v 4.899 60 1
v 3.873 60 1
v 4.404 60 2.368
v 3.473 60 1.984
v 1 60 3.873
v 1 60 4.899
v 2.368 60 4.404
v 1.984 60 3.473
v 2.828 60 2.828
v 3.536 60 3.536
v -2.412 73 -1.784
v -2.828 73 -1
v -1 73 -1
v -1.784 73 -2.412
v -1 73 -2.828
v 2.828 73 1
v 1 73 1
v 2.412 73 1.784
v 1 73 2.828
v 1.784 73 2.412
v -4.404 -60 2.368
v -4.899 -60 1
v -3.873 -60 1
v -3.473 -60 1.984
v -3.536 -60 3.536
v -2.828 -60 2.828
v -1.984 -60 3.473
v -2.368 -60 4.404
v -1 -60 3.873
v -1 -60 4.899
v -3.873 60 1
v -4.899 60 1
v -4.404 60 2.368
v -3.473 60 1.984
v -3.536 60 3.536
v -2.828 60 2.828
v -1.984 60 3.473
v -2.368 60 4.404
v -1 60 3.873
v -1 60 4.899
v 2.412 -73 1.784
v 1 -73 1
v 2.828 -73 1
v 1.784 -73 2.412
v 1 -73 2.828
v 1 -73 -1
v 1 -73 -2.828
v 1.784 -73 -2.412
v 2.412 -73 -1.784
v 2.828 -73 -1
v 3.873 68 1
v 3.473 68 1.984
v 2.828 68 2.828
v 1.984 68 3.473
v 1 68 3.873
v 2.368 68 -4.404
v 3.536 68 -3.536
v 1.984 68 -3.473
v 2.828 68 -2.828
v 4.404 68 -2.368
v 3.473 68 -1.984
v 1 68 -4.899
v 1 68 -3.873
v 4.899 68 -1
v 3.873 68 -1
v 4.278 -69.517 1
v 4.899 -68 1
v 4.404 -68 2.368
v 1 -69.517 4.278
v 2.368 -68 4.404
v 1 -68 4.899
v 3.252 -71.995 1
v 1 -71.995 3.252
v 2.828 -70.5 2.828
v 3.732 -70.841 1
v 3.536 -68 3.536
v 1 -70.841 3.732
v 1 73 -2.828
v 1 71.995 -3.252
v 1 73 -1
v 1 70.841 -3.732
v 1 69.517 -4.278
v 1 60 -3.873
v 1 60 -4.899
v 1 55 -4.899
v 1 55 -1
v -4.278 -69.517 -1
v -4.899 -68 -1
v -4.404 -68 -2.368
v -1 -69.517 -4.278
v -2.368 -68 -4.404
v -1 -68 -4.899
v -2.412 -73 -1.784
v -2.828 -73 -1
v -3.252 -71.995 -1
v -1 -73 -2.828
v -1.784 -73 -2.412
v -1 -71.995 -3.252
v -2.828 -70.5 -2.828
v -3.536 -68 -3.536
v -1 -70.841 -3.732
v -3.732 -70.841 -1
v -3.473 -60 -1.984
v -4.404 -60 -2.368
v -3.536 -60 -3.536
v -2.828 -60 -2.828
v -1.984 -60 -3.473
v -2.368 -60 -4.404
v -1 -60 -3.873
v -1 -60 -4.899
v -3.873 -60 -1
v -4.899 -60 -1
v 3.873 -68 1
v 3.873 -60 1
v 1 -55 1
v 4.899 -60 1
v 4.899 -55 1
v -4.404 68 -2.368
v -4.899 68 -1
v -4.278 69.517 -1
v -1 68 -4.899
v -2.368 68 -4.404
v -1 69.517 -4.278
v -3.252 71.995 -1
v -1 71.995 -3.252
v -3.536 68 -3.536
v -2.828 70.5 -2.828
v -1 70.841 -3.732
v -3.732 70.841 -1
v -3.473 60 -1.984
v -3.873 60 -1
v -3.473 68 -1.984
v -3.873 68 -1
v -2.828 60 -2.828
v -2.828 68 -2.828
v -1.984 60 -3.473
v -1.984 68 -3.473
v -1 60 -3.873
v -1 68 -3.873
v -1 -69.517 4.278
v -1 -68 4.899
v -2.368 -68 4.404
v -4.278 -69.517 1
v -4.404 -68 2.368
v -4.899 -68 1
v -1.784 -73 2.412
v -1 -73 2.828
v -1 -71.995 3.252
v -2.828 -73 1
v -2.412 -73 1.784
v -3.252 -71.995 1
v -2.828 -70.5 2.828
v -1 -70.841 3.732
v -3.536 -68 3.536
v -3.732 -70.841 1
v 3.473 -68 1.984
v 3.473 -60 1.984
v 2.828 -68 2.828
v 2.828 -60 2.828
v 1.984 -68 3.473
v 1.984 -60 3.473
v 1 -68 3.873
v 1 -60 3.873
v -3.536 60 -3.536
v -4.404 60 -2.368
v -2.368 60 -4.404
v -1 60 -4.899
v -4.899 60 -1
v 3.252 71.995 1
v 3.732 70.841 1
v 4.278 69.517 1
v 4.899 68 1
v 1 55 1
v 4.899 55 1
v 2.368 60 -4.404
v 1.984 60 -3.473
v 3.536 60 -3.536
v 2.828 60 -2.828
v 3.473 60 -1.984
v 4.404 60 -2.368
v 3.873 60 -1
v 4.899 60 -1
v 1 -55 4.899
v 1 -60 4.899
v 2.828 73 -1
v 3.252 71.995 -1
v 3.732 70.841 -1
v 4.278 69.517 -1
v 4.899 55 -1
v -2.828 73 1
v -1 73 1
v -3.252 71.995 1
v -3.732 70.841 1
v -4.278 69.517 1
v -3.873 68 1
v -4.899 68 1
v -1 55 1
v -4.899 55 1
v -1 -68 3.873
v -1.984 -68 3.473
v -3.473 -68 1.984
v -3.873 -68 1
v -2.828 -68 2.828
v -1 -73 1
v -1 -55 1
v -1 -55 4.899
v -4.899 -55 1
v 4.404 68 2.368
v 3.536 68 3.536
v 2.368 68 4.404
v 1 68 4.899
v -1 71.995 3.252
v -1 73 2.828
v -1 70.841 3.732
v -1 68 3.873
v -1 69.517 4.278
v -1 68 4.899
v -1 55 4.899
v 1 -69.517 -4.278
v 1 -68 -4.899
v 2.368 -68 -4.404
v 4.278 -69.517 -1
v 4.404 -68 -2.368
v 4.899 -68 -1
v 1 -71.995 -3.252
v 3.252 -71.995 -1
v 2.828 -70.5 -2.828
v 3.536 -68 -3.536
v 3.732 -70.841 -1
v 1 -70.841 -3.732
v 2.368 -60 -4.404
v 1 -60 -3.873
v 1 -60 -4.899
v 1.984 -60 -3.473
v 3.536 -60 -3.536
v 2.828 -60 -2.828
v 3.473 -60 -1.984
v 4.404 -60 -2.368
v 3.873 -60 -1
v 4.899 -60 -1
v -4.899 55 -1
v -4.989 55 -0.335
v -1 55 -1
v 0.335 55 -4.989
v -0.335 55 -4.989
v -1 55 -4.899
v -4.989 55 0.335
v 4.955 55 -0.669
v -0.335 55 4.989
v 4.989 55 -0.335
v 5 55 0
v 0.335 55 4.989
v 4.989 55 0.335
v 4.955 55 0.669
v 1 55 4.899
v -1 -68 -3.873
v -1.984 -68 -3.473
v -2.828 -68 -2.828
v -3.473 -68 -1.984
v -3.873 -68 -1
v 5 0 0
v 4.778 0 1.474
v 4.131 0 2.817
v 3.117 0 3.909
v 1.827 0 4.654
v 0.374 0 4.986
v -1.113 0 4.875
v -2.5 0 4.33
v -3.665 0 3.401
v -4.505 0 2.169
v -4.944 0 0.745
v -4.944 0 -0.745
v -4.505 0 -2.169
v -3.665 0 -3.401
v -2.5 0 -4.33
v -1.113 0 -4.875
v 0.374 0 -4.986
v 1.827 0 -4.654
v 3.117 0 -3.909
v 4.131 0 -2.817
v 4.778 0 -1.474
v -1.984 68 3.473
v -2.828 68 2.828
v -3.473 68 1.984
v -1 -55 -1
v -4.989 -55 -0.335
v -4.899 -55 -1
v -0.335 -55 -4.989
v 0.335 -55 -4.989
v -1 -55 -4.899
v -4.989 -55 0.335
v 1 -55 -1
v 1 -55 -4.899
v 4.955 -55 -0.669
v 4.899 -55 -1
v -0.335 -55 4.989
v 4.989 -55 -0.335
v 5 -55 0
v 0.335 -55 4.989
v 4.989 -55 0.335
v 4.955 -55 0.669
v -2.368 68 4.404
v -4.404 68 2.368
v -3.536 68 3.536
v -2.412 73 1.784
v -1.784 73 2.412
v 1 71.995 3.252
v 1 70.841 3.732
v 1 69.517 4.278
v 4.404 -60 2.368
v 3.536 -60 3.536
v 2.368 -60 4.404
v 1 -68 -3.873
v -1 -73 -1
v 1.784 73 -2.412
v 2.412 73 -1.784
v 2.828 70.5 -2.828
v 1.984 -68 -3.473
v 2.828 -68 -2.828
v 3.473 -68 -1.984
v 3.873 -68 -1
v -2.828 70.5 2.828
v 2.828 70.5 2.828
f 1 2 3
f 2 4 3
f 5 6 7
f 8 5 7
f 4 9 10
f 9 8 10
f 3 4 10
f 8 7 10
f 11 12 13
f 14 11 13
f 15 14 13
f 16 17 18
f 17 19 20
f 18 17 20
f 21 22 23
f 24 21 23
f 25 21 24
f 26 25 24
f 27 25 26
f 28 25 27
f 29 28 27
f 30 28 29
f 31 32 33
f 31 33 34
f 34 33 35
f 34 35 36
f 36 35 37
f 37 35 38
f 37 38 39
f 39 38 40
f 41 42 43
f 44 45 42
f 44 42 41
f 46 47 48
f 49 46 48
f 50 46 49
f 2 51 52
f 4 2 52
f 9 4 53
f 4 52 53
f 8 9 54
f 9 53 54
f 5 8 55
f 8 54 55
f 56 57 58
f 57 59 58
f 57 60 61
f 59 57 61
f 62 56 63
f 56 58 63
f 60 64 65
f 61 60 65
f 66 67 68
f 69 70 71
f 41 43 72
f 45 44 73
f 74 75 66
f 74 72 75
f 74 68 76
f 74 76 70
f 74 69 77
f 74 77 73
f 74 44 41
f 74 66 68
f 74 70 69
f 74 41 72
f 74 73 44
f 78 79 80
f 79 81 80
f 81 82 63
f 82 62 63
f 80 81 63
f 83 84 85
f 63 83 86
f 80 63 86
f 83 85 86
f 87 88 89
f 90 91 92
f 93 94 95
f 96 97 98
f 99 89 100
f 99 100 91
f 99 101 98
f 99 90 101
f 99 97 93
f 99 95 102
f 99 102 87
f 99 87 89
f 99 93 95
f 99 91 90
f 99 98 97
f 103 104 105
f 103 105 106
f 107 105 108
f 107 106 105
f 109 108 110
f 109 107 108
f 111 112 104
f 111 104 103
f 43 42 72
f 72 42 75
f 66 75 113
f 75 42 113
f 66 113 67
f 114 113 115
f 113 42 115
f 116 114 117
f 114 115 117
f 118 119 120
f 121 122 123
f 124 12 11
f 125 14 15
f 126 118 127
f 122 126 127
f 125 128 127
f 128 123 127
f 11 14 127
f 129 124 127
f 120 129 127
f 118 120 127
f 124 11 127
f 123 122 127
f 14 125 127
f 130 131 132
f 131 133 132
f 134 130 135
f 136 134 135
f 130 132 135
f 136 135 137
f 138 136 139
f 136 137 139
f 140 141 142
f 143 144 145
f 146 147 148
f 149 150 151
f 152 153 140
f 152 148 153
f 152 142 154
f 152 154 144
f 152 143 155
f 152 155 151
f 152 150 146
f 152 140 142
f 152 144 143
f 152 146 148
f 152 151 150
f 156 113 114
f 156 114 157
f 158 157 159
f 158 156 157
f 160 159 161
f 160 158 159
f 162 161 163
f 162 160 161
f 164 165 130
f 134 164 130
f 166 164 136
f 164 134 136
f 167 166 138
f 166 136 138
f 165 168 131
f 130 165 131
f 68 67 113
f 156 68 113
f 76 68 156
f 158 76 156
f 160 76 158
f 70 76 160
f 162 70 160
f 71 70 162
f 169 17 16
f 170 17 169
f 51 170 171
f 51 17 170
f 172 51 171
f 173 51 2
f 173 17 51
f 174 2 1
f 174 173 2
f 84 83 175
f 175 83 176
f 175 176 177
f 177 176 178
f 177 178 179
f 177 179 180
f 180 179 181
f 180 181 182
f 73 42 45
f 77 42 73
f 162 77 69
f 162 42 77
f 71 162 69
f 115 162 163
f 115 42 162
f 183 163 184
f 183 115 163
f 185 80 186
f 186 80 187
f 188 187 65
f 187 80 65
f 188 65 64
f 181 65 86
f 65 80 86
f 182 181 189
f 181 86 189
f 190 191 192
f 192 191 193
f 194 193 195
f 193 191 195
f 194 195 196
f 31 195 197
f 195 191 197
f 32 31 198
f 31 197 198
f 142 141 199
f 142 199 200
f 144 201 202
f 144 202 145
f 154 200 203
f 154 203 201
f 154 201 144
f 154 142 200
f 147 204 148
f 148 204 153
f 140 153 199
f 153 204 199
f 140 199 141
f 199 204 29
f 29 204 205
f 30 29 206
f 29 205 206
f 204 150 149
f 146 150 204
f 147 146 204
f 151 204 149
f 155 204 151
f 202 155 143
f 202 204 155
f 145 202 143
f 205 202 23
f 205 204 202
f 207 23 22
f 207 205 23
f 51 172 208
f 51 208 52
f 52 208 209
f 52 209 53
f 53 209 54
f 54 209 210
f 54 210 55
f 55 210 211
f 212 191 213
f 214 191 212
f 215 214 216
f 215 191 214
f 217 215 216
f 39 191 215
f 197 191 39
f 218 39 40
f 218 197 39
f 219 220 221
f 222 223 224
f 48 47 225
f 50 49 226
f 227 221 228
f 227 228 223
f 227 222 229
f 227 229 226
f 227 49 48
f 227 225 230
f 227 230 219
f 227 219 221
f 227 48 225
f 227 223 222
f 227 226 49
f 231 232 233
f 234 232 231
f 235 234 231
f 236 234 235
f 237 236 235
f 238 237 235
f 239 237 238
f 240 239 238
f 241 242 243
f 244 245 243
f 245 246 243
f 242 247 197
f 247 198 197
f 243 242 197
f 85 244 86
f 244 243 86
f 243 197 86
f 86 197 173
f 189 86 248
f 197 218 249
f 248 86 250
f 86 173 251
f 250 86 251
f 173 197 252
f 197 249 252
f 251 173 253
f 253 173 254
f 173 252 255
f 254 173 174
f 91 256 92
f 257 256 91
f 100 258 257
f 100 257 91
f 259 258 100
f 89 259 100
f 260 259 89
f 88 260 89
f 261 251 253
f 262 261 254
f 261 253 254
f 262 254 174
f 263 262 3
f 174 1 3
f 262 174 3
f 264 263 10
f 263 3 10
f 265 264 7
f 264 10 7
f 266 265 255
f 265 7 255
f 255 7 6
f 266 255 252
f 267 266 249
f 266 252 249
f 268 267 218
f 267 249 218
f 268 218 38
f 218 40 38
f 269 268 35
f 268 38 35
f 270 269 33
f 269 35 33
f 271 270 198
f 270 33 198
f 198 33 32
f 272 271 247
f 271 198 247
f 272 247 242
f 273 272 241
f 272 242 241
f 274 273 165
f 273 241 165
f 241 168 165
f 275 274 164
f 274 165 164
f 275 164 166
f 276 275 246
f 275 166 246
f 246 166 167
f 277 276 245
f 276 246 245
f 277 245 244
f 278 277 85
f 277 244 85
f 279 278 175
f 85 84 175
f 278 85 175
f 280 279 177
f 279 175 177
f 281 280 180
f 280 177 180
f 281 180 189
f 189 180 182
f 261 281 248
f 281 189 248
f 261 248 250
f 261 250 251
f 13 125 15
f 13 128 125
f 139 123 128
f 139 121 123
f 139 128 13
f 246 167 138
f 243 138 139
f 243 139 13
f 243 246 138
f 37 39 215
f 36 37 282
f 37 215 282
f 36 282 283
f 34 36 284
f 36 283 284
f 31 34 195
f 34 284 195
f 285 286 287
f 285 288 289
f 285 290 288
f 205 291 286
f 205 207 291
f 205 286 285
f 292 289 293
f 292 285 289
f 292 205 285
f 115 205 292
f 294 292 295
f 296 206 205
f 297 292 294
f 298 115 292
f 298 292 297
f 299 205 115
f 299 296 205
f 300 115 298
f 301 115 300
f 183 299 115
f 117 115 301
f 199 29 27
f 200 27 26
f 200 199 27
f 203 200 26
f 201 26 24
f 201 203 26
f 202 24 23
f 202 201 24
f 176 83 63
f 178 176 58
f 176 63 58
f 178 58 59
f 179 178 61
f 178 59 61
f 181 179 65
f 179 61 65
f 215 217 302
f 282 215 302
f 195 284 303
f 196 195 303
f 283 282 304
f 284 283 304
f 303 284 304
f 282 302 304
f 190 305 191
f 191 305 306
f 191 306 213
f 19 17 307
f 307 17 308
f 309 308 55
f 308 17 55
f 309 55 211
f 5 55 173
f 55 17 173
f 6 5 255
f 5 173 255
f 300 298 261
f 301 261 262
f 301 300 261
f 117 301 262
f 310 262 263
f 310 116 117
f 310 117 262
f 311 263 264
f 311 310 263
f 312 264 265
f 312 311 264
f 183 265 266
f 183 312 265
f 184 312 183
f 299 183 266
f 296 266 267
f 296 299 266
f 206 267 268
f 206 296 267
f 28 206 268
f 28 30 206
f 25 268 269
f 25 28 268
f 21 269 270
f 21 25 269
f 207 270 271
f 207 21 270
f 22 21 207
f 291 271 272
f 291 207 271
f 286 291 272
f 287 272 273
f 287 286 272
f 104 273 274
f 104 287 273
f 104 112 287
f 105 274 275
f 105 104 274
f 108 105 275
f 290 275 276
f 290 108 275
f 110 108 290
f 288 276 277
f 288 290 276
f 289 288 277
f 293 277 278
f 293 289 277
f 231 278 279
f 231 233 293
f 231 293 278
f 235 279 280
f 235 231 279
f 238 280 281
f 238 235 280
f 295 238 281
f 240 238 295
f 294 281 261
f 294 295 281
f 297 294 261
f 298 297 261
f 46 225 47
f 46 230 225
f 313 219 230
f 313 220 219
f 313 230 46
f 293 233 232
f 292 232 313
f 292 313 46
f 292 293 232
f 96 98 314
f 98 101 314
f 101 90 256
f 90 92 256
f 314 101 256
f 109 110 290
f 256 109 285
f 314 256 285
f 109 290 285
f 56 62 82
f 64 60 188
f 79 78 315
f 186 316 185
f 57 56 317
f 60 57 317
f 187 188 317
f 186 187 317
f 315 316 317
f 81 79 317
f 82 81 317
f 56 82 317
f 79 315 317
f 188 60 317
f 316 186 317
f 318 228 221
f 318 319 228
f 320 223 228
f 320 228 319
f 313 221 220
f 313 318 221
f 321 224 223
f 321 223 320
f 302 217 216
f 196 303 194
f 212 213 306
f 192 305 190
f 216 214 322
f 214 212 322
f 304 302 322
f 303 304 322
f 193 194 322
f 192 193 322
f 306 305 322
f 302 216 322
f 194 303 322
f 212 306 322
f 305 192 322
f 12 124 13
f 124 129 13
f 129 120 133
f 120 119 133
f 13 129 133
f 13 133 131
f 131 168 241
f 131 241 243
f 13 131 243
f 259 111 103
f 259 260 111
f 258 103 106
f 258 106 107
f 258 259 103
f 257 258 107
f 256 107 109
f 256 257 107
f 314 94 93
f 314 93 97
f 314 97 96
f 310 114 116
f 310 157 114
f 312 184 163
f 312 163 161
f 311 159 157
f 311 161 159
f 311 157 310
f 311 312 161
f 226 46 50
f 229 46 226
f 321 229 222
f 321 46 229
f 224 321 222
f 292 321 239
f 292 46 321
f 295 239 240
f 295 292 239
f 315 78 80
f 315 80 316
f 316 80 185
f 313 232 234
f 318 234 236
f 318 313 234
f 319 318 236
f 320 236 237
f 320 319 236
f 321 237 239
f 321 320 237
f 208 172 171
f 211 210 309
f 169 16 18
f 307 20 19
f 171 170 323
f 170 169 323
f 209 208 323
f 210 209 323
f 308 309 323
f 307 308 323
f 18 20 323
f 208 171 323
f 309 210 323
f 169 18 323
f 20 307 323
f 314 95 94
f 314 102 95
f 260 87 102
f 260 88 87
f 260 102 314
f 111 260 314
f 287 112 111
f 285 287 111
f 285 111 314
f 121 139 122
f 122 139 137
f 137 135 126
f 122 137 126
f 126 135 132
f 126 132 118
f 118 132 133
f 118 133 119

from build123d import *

# Parameters (mm, degrees)
F0_W     = 4
F0_H     = 8
F3_START = -55
F2_W     = 10.6760558783
F2_H     = 2
F2_W_2   = 2
F2_H_2   = 10.1549292555
F3_DEPTH = 18


with BuildPart() as f1:
    # F0 (on Top) → F1 (revolve)
    with BuildSketch(Plane.XY):
        Polygon((0, 73), (0, 68), (4, 68), (5, 68), (3, 73), align=None)
        with Locations((2, 64)):
            Rectangle(F0_W, F0_H)
        Polygon((0, 60), (0, 0), (5, 0), (5, 60), (4, 60), align=None)
    revolve(axis=Axis((0, 30, 0), (0, -1, 0)))

    # F2 (on Front) → F3 (cut)
    with BuildSketch(Plane.XZ.offset(F3_START)):
        with Locations((-6.3380279391, 0)):
            Rectangle(F2_W, F2_H)
        Rectangle(F2_W_2, F2_H)
        with Locations((0, 6.0774646278)):
            Rectangle(F2_W_2, F2_H_2)
        with Locations((6.3380279391, 0)):
            Rectangle(F2_W, F2_H)
        with Locations((0, -6.0774646278)):
            Rectangle(F2_W_2, F2_H_2)
    extrude(amount=-F3_DEPTH, mode=Mode.SUBTRACT)

    # F4: F1 across face


with BuildPart() as f1_1:
    add(f1.part)
    add(f1.part.mirror(Plane.XZ))


solid = f1_1.part
